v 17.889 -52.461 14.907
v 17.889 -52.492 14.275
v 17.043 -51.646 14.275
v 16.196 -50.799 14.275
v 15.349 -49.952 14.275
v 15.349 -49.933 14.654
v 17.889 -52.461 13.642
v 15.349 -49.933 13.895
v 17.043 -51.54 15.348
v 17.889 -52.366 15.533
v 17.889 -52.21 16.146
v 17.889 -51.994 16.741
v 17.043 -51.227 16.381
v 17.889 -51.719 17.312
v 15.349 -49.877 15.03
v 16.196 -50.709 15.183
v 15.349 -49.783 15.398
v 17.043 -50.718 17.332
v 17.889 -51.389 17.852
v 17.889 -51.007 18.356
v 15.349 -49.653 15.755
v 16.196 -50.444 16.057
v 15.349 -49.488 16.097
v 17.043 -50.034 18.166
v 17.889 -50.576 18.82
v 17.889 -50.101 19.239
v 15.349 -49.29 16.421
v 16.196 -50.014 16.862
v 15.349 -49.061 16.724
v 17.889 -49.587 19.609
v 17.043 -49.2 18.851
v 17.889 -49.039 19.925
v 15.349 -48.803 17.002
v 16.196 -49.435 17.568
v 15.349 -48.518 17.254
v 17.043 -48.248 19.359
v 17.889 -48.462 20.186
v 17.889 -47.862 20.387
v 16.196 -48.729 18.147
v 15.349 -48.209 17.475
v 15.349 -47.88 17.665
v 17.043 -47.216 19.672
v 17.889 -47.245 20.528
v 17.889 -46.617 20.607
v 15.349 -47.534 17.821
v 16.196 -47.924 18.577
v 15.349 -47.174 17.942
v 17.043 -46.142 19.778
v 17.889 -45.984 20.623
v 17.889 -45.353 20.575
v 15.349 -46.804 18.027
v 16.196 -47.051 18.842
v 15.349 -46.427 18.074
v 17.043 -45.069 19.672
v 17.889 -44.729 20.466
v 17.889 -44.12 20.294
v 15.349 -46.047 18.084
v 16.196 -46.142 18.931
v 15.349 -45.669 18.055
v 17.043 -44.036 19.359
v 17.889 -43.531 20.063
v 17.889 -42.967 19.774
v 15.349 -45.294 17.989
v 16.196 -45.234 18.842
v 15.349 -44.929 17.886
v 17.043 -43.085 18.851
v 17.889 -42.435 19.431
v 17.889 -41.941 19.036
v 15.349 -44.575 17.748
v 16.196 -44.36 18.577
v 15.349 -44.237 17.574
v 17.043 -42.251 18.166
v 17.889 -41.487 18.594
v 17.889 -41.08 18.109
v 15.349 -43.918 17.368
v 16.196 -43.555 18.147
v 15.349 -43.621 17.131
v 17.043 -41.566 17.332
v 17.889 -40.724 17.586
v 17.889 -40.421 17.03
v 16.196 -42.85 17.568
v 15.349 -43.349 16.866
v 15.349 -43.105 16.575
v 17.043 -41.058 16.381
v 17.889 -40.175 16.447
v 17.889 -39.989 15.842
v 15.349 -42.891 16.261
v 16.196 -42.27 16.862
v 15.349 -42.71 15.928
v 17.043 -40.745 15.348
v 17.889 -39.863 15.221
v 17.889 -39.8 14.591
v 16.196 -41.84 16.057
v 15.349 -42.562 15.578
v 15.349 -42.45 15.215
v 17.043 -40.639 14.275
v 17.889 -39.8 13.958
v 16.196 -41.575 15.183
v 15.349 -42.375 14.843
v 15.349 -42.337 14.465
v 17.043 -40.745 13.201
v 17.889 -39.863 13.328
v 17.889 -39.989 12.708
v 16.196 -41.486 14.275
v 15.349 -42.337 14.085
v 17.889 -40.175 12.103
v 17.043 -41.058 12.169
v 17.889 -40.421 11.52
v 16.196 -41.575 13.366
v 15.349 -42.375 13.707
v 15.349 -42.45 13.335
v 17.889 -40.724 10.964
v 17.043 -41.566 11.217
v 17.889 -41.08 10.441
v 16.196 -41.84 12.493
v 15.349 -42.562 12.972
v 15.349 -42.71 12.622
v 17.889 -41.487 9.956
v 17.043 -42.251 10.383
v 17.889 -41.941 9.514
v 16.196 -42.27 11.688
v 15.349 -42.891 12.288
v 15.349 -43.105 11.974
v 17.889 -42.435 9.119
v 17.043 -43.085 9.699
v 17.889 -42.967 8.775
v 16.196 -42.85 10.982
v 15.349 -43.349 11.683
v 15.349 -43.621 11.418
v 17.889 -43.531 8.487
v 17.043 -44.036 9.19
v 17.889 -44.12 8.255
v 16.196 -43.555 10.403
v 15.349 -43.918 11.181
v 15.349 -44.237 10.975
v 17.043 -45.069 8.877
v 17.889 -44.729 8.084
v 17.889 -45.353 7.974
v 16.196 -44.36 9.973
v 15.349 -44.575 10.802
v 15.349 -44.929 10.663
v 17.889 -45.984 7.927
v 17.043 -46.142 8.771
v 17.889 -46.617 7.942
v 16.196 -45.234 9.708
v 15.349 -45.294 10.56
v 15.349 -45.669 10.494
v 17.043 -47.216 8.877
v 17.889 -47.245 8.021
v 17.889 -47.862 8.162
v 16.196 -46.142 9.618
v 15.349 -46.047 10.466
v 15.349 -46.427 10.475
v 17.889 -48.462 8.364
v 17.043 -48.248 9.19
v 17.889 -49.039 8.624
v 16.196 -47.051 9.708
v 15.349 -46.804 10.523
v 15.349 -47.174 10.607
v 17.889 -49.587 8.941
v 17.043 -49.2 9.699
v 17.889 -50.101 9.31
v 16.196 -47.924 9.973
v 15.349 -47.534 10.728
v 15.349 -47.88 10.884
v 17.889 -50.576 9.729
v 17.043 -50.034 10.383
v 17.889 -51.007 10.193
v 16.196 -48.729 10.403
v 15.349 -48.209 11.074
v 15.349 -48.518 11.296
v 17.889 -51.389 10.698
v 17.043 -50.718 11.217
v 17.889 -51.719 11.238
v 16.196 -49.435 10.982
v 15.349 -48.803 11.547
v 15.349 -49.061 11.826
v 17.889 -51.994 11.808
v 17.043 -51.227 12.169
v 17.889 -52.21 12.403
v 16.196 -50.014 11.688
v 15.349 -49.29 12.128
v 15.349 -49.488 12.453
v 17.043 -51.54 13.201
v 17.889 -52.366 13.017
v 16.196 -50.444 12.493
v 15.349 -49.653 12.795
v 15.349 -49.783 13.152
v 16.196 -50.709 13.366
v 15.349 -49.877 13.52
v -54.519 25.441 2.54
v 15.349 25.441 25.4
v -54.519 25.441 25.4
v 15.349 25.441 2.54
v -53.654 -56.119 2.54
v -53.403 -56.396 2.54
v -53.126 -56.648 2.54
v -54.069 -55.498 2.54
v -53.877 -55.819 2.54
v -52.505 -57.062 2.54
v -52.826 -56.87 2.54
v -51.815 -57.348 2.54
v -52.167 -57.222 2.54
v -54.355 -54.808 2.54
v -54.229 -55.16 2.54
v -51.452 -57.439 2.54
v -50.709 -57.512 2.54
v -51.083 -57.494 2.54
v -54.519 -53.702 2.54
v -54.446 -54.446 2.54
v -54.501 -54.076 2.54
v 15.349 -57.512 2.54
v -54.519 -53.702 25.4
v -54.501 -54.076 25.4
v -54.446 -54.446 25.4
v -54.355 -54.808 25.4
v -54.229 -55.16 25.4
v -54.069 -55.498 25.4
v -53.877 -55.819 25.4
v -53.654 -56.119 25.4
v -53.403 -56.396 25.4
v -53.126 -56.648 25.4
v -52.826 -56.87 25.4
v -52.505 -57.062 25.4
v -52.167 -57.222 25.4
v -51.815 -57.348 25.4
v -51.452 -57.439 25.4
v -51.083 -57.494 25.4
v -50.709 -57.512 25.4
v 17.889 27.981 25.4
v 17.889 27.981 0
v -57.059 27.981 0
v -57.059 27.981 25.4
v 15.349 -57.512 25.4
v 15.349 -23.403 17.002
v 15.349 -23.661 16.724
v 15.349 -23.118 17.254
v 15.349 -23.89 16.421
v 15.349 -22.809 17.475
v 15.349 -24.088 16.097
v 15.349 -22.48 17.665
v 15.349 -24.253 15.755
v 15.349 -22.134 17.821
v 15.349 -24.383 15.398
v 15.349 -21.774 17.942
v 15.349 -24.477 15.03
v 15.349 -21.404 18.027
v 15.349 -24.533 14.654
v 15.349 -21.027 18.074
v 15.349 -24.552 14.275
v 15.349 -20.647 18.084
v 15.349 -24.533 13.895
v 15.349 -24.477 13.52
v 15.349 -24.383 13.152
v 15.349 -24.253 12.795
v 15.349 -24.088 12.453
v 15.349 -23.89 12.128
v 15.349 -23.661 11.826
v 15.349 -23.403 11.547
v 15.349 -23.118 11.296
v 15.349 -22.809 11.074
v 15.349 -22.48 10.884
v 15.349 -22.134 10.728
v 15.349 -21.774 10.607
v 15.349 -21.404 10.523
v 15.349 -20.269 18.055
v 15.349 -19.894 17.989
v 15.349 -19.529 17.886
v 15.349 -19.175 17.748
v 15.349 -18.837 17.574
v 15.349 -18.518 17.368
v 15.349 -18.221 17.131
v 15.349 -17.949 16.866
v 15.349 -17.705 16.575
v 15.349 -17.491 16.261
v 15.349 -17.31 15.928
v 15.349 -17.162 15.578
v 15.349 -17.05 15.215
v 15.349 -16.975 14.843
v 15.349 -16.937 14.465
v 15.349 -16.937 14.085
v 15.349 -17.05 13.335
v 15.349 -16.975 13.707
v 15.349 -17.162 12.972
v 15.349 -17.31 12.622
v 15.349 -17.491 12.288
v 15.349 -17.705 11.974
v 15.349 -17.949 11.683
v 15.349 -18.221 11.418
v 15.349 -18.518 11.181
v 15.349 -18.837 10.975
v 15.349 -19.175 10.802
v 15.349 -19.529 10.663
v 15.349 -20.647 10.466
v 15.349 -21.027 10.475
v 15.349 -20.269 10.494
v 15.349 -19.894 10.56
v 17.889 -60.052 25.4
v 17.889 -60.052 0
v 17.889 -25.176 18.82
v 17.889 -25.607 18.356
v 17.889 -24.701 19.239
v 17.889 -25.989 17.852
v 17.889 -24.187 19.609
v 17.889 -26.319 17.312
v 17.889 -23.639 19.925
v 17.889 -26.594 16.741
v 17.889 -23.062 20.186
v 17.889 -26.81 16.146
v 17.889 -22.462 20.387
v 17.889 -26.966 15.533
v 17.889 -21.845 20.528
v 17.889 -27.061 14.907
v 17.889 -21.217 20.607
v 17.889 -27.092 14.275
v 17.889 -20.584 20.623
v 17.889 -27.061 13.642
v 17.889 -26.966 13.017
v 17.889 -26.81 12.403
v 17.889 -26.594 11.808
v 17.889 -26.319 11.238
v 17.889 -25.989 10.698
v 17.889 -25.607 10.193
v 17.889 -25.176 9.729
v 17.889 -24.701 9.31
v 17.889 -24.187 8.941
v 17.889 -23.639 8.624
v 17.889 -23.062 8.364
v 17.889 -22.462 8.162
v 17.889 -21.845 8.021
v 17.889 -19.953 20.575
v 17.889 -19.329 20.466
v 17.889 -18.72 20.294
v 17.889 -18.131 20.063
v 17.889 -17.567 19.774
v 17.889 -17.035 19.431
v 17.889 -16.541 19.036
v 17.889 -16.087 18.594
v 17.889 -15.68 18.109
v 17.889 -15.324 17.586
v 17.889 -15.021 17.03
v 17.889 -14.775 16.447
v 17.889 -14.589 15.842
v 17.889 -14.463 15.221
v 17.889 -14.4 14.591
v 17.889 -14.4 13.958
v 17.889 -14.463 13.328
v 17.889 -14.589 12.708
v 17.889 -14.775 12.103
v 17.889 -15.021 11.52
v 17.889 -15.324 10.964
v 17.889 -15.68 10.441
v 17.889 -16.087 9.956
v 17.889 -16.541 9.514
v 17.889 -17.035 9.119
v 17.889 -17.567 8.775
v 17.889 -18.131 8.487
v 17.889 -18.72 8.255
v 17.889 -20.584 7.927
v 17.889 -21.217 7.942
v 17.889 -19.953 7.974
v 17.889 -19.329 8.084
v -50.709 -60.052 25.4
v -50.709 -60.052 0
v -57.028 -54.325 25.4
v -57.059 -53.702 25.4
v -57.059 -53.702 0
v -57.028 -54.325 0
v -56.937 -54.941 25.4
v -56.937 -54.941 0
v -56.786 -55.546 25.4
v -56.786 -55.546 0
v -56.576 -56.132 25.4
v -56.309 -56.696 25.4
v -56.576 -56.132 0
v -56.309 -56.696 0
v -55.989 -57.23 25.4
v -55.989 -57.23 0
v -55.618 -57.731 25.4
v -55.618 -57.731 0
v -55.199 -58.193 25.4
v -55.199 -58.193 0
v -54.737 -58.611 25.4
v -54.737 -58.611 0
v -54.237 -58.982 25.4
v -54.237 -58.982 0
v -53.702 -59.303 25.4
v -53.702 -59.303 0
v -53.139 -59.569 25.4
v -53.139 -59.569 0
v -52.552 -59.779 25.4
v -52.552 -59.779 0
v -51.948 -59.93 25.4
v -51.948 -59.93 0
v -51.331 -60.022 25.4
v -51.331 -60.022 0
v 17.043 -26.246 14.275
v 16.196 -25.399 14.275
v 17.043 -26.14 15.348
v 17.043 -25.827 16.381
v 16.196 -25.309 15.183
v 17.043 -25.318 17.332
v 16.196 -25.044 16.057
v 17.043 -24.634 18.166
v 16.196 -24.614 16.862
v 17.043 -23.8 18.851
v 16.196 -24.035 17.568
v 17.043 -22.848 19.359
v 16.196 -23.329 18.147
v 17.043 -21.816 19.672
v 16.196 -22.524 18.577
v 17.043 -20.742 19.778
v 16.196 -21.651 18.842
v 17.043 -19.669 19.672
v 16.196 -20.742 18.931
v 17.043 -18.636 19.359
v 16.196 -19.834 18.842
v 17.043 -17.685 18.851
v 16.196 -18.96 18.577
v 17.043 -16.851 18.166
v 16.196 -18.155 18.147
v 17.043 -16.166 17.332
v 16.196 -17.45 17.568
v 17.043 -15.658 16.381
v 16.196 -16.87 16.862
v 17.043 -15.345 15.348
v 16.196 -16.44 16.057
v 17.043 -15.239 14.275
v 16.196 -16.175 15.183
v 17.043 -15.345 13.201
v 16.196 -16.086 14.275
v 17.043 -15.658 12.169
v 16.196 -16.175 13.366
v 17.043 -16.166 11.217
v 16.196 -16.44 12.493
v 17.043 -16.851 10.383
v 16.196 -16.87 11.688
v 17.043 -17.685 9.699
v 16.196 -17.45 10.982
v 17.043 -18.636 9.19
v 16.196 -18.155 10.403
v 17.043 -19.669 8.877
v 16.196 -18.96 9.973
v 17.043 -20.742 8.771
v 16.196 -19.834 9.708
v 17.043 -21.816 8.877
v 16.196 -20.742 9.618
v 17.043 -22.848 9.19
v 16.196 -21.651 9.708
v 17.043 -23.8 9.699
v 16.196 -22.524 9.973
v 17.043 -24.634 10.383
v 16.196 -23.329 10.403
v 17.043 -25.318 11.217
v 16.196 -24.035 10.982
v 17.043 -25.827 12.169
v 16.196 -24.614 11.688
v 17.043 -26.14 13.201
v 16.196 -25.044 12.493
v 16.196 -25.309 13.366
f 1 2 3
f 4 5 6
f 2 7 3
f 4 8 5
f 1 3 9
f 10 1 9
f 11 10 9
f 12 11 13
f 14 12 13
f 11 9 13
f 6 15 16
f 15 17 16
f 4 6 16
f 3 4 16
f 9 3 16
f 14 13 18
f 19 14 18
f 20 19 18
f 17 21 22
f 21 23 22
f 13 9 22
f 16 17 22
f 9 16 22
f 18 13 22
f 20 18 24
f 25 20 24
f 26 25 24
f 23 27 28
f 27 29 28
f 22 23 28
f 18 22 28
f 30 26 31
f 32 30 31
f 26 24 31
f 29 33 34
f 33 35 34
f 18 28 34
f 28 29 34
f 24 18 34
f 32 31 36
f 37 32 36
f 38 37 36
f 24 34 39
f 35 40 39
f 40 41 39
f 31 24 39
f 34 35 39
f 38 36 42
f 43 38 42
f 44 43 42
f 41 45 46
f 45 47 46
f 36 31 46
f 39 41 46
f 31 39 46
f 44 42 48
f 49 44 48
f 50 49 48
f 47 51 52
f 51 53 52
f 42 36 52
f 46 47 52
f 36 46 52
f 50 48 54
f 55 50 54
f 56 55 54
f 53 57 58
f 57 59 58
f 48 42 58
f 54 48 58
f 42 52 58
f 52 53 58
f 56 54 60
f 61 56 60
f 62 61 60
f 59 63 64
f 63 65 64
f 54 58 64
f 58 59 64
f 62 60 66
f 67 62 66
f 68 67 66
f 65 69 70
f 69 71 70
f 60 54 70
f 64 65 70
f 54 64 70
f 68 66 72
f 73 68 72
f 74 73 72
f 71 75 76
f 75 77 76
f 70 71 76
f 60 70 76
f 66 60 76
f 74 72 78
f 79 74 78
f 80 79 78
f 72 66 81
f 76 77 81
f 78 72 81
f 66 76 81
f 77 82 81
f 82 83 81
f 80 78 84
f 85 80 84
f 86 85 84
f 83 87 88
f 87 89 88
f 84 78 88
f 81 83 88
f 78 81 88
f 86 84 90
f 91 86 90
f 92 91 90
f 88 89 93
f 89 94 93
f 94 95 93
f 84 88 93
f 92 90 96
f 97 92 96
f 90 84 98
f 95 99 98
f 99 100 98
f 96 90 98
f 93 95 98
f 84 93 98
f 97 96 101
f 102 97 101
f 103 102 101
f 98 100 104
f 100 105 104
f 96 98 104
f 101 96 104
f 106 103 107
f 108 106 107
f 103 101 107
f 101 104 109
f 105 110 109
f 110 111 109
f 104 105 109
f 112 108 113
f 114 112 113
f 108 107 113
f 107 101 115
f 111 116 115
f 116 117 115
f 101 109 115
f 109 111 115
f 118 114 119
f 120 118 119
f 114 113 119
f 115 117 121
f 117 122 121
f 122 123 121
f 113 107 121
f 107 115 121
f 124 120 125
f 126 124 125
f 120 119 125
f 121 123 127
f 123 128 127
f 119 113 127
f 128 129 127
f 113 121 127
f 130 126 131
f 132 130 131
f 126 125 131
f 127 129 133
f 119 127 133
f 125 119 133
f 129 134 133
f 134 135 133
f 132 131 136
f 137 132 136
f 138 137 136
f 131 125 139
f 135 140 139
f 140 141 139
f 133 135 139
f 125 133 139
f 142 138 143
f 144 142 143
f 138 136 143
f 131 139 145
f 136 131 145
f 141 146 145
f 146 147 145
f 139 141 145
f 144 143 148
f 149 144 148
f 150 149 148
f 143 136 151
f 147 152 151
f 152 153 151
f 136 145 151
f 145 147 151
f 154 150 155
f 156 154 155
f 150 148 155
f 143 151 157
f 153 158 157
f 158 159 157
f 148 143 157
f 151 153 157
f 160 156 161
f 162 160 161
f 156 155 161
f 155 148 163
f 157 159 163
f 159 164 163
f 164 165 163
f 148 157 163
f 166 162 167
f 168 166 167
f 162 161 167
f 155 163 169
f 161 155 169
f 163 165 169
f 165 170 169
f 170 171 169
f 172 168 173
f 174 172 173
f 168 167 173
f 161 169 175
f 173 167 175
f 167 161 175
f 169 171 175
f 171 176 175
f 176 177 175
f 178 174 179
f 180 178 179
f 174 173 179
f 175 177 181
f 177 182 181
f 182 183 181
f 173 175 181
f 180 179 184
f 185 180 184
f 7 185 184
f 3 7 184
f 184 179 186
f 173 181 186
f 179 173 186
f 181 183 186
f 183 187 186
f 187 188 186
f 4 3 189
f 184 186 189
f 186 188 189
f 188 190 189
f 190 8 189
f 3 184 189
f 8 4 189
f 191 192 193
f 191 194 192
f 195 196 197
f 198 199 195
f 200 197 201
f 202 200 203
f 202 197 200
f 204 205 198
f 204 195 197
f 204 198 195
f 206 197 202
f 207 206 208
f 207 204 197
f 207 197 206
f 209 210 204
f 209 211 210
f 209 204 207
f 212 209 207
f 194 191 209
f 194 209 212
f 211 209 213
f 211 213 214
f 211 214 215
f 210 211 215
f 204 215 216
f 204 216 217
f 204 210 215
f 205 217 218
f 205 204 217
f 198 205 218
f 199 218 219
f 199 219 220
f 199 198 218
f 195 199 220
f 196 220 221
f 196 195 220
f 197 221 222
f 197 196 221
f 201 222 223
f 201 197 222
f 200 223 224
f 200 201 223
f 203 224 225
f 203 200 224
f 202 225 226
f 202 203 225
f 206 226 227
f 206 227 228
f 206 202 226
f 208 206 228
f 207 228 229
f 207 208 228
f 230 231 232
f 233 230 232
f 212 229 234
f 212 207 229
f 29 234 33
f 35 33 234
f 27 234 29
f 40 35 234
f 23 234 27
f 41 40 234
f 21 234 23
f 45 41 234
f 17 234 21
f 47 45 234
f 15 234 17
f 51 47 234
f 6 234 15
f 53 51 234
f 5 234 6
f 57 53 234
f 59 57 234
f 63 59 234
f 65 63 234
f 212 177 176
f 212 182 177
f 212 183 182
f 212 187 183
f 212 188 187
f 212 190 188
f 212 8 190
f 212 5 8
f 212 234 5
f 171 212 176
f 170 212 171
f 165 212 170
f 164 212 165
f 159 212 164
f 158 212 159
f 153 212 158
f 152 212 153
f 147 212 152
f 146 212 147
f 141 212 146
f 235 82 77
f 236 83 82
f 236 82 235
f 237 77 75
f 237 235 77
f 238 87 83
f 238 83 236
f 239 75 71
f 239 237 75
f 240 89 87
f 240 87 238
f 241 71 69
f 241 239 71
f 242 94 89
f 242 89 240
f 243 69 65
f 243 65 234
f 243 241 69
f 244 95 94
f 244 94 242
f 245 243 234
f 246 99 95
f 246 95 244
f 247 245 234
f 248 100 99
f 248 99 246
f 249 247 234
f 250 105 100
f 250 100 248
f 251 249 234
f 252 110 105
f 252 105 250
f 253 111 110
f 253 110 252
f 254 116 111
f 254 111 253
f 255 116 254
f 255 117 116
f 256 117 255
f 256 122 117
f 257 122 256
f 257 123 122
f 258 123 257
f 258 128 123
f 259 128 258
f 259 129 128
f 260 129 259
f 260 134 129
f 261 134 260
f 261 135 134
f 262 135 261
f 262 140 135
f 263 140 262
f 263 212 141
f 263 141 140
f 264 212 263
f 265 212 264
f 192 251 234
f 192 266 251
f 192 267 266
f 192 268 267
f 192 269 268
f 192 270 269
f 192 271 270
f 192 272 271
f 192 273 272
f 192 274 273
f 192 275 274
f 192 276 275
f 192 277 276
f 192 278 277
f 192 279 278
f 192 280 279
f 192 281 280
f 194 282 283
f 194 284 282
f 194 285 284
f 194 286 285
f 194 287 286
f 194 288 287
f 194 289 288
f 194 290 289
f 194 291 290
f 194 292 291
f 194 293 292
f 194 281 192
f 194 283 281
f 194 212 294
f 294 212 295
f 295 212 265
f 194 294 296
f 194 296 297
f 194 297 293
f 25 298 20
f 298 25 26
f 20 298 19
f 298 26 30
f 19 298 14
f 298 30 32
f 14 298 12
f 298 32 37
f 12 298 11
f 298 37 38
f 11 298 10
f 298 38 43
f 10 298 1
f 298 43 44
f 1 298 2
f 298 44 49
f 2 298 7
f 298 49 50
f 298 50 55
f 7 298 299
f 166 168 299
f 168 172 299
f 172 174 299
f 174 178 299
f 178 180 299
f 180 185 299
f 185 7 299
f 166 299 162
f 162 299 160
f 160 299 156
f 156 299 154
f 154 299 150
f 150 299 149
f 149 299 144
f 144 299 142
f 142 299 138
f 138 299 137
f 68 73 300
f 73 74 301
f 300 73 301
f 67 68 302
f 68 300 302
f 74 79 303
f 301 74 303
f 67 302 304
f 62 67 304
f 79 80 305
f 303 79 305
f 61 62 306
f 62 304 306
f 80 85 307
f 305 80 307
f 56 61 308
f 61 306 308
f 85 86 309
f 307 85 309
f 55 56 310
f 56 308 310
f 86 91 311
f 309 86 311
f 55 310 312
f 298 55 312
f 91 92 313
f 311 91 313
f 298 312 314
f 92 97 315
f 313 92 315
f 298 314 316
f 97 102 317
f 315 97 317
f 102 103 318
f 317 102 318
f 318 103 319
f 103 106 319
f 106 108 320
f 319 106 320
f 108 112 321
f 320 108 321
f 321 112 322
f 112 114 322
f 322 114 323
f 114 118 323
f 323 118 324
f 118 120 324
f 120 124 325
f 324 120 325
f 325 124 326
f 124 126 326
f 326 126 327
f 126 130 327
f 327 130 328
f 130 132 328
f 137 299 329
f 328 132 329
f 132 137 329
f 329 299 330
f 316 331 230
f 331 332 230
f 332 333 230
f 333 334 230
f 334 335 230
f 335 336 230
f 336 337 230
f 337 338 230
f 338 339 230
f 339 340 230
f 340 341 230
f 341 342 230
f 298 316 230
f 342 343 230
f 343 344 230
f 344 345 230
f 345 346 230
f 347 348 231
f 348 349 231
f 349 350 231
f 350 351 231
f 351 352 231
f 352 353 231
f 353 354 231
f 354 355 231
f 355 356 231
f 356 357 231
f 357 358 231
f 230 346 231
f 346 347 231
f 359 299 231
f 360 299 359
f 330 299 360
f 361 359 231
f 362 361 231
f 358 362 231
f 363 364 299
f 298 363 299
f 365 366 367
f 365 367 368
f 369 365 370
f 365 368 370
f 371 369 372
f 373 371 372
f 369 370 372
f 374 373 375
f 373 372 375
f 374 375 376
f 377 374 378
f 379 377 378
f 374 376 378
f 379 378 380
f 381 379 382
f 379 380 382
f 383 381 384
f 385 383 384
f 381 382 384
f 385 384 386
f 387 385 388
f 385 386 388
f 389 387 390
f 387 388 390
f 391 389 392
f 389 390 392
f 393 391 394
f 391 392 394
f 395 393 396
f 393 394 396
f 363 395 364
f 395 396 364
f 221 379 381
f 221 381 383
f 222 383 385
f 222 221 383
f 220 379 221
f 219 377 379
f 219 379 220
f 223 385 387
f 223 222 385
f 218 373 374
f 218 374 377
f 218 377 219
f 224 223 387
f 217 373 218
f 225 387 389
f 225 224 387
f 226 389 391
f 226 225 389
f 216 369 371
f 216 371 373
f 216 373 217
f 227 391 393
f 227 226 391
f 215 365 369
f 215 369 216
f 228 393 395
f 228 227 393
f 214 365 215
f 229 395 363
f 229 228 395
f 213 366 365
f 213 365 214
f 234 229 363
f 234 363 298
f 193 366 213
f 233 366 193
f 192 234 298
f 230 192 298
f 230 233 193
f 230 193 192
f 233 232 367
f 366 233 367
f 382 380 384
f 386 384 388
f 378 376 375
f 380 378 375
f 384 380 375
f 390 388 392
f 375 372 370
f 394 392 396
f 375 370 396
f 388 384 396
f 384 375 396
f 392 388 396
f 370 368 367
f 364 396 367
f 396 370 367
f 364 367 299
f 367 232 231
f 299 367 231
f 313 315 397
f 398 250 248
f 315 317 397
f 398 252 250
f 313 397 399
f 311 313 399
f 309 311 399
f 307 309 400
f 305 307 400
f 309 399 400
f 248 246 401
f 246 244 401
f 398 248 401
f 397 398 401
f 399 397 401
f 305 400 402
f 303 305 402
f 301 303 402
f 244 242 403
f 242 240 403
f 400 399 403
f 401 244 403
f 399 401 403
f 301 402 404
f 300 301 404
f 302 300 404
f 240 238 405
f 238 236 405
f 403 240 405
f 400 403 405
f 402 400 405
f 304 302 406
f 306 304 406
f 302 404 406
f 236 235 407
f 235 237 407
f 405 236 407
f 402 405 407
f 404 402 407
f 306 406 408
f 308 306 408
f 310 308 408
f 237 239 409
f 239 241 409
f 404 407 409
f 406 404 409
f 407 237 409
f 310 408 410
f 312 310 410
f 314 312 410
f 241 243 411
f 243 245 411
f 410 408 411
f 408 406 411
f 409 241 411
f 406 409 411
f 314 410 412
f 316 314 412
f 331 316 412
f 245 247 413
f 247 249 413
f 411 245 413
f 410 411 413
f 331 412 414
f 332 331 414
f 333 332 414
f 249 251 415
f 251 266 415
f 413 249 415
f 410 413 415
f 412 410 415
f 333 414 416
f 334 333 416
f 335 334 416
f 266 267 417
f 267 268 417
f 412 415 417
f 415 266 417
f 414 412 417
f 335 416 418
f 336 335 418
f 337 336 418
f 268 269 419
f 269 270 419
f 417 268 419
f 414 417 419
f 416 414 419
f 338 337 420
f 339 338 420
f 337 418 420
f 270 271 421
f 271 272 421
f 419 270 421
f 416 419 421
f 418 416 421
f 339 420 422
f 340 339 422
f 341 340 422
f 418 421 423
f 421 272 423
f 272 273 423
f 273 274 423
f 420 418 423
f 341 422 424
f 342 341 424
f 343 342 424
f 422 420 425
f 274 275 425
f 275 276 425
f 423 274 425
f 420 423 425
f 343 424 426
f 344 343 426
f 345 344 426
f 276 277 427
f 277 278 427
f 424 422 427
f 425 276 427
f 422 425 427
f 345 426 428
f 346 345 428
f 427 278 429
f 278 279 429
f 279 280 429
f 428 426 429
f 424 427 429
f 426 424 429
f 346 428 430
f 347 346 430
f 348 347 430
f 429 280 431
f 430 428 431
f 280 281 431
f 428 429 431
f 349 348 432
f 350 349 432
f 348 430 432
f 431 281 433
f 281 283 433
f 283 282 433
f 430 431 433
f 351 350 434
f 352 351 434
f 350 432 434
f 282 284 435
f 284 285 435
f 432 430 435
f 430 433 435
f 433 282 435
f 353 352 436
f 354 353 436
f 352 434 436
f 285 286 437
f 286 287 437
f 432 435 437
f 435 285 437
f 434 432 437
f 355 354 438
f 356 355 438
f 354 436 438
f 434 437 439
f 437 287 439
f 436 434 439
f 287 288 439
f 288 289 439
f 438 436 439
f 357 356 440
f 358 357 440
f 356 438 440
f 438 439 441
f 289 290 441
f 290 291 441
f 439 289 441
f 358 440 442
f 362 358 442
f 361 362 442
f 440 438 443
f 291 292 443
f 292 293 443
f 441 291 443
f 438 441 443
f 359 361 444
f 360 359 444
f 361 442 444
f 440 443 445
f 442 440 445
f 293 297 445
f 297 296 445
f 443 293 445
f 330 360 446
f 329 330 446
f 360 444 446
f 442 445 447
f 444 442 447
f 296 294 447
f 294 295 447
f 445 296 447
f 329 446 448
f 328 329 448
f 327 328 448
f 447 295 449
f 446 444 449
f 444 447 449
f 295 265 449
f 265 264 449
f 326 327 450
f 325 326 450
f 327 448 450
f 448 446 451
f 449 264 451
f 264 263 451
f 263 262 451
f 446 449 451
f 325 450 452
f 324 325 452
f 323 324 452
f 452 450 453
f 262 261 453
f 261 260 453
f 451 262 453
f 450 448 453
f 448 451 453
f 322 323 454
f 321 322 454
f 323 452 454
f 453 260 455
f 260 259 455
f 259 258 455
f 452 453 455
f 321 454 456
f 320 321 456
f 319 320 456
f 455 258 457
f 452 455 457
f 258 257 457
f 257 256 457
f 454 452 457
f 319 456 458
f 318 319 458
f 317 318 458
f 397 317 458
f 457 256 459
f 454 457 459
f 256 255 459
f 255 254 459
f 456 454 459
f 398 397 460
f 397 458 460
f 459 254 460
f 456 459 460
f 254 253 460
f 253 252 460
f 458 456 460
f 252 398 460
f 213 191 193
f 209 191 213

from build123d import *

# Parameters (mm, degrees)
F1_DEPTH       = 25.4
F2_T           = -2.54
F4_D           = 6.35
F4_DEPTH       = 12.7
F4_CSINK_D     = 12.7
F4_CSINK_ANGLE = 90


with BuildPart() as f1:
    # F0 (on Top) → F1 (new body)
    with BuildSketch(Plane.XY):
        with BuildLine():
            ThreePointArc((-57.059065, -53.702373), (-55.199193, -58.192501), (-50.709065, -60.052373))
            Line((-50.709065, -60.052373), (17.889393, -60.052373))
            Line((17.889393, -60.052373), (17.889393, 27.981024))
            Line((17.889393, 27.981024), (-57.059065, 27.981024))
            Line((-57.059065, 27.981024), (-57.059065, -53.702373))
        make_face()
    extrude(amount=F1_DEPTH)

    # F2
    f2_openings = [f1.faces().sort_by_distance(p)[0] for p in [
        (-19.537486, -15.979733, 25.4),
    ]]
    offset(amount=F2_T, openings=f2_openings)

    # F4
    with Locations(Plane.YZ.offset(17.889393)):
        with Locations((-46.142266, 14.274741), (-20.742266, 14.274741)):
            CounterSinkHole(F4_D / 2, F4_CSINK_D / 2, depth=F4_DEPTH, counter_sink_angle=F4_CSINK_ANGLE)


solid = f1.part
